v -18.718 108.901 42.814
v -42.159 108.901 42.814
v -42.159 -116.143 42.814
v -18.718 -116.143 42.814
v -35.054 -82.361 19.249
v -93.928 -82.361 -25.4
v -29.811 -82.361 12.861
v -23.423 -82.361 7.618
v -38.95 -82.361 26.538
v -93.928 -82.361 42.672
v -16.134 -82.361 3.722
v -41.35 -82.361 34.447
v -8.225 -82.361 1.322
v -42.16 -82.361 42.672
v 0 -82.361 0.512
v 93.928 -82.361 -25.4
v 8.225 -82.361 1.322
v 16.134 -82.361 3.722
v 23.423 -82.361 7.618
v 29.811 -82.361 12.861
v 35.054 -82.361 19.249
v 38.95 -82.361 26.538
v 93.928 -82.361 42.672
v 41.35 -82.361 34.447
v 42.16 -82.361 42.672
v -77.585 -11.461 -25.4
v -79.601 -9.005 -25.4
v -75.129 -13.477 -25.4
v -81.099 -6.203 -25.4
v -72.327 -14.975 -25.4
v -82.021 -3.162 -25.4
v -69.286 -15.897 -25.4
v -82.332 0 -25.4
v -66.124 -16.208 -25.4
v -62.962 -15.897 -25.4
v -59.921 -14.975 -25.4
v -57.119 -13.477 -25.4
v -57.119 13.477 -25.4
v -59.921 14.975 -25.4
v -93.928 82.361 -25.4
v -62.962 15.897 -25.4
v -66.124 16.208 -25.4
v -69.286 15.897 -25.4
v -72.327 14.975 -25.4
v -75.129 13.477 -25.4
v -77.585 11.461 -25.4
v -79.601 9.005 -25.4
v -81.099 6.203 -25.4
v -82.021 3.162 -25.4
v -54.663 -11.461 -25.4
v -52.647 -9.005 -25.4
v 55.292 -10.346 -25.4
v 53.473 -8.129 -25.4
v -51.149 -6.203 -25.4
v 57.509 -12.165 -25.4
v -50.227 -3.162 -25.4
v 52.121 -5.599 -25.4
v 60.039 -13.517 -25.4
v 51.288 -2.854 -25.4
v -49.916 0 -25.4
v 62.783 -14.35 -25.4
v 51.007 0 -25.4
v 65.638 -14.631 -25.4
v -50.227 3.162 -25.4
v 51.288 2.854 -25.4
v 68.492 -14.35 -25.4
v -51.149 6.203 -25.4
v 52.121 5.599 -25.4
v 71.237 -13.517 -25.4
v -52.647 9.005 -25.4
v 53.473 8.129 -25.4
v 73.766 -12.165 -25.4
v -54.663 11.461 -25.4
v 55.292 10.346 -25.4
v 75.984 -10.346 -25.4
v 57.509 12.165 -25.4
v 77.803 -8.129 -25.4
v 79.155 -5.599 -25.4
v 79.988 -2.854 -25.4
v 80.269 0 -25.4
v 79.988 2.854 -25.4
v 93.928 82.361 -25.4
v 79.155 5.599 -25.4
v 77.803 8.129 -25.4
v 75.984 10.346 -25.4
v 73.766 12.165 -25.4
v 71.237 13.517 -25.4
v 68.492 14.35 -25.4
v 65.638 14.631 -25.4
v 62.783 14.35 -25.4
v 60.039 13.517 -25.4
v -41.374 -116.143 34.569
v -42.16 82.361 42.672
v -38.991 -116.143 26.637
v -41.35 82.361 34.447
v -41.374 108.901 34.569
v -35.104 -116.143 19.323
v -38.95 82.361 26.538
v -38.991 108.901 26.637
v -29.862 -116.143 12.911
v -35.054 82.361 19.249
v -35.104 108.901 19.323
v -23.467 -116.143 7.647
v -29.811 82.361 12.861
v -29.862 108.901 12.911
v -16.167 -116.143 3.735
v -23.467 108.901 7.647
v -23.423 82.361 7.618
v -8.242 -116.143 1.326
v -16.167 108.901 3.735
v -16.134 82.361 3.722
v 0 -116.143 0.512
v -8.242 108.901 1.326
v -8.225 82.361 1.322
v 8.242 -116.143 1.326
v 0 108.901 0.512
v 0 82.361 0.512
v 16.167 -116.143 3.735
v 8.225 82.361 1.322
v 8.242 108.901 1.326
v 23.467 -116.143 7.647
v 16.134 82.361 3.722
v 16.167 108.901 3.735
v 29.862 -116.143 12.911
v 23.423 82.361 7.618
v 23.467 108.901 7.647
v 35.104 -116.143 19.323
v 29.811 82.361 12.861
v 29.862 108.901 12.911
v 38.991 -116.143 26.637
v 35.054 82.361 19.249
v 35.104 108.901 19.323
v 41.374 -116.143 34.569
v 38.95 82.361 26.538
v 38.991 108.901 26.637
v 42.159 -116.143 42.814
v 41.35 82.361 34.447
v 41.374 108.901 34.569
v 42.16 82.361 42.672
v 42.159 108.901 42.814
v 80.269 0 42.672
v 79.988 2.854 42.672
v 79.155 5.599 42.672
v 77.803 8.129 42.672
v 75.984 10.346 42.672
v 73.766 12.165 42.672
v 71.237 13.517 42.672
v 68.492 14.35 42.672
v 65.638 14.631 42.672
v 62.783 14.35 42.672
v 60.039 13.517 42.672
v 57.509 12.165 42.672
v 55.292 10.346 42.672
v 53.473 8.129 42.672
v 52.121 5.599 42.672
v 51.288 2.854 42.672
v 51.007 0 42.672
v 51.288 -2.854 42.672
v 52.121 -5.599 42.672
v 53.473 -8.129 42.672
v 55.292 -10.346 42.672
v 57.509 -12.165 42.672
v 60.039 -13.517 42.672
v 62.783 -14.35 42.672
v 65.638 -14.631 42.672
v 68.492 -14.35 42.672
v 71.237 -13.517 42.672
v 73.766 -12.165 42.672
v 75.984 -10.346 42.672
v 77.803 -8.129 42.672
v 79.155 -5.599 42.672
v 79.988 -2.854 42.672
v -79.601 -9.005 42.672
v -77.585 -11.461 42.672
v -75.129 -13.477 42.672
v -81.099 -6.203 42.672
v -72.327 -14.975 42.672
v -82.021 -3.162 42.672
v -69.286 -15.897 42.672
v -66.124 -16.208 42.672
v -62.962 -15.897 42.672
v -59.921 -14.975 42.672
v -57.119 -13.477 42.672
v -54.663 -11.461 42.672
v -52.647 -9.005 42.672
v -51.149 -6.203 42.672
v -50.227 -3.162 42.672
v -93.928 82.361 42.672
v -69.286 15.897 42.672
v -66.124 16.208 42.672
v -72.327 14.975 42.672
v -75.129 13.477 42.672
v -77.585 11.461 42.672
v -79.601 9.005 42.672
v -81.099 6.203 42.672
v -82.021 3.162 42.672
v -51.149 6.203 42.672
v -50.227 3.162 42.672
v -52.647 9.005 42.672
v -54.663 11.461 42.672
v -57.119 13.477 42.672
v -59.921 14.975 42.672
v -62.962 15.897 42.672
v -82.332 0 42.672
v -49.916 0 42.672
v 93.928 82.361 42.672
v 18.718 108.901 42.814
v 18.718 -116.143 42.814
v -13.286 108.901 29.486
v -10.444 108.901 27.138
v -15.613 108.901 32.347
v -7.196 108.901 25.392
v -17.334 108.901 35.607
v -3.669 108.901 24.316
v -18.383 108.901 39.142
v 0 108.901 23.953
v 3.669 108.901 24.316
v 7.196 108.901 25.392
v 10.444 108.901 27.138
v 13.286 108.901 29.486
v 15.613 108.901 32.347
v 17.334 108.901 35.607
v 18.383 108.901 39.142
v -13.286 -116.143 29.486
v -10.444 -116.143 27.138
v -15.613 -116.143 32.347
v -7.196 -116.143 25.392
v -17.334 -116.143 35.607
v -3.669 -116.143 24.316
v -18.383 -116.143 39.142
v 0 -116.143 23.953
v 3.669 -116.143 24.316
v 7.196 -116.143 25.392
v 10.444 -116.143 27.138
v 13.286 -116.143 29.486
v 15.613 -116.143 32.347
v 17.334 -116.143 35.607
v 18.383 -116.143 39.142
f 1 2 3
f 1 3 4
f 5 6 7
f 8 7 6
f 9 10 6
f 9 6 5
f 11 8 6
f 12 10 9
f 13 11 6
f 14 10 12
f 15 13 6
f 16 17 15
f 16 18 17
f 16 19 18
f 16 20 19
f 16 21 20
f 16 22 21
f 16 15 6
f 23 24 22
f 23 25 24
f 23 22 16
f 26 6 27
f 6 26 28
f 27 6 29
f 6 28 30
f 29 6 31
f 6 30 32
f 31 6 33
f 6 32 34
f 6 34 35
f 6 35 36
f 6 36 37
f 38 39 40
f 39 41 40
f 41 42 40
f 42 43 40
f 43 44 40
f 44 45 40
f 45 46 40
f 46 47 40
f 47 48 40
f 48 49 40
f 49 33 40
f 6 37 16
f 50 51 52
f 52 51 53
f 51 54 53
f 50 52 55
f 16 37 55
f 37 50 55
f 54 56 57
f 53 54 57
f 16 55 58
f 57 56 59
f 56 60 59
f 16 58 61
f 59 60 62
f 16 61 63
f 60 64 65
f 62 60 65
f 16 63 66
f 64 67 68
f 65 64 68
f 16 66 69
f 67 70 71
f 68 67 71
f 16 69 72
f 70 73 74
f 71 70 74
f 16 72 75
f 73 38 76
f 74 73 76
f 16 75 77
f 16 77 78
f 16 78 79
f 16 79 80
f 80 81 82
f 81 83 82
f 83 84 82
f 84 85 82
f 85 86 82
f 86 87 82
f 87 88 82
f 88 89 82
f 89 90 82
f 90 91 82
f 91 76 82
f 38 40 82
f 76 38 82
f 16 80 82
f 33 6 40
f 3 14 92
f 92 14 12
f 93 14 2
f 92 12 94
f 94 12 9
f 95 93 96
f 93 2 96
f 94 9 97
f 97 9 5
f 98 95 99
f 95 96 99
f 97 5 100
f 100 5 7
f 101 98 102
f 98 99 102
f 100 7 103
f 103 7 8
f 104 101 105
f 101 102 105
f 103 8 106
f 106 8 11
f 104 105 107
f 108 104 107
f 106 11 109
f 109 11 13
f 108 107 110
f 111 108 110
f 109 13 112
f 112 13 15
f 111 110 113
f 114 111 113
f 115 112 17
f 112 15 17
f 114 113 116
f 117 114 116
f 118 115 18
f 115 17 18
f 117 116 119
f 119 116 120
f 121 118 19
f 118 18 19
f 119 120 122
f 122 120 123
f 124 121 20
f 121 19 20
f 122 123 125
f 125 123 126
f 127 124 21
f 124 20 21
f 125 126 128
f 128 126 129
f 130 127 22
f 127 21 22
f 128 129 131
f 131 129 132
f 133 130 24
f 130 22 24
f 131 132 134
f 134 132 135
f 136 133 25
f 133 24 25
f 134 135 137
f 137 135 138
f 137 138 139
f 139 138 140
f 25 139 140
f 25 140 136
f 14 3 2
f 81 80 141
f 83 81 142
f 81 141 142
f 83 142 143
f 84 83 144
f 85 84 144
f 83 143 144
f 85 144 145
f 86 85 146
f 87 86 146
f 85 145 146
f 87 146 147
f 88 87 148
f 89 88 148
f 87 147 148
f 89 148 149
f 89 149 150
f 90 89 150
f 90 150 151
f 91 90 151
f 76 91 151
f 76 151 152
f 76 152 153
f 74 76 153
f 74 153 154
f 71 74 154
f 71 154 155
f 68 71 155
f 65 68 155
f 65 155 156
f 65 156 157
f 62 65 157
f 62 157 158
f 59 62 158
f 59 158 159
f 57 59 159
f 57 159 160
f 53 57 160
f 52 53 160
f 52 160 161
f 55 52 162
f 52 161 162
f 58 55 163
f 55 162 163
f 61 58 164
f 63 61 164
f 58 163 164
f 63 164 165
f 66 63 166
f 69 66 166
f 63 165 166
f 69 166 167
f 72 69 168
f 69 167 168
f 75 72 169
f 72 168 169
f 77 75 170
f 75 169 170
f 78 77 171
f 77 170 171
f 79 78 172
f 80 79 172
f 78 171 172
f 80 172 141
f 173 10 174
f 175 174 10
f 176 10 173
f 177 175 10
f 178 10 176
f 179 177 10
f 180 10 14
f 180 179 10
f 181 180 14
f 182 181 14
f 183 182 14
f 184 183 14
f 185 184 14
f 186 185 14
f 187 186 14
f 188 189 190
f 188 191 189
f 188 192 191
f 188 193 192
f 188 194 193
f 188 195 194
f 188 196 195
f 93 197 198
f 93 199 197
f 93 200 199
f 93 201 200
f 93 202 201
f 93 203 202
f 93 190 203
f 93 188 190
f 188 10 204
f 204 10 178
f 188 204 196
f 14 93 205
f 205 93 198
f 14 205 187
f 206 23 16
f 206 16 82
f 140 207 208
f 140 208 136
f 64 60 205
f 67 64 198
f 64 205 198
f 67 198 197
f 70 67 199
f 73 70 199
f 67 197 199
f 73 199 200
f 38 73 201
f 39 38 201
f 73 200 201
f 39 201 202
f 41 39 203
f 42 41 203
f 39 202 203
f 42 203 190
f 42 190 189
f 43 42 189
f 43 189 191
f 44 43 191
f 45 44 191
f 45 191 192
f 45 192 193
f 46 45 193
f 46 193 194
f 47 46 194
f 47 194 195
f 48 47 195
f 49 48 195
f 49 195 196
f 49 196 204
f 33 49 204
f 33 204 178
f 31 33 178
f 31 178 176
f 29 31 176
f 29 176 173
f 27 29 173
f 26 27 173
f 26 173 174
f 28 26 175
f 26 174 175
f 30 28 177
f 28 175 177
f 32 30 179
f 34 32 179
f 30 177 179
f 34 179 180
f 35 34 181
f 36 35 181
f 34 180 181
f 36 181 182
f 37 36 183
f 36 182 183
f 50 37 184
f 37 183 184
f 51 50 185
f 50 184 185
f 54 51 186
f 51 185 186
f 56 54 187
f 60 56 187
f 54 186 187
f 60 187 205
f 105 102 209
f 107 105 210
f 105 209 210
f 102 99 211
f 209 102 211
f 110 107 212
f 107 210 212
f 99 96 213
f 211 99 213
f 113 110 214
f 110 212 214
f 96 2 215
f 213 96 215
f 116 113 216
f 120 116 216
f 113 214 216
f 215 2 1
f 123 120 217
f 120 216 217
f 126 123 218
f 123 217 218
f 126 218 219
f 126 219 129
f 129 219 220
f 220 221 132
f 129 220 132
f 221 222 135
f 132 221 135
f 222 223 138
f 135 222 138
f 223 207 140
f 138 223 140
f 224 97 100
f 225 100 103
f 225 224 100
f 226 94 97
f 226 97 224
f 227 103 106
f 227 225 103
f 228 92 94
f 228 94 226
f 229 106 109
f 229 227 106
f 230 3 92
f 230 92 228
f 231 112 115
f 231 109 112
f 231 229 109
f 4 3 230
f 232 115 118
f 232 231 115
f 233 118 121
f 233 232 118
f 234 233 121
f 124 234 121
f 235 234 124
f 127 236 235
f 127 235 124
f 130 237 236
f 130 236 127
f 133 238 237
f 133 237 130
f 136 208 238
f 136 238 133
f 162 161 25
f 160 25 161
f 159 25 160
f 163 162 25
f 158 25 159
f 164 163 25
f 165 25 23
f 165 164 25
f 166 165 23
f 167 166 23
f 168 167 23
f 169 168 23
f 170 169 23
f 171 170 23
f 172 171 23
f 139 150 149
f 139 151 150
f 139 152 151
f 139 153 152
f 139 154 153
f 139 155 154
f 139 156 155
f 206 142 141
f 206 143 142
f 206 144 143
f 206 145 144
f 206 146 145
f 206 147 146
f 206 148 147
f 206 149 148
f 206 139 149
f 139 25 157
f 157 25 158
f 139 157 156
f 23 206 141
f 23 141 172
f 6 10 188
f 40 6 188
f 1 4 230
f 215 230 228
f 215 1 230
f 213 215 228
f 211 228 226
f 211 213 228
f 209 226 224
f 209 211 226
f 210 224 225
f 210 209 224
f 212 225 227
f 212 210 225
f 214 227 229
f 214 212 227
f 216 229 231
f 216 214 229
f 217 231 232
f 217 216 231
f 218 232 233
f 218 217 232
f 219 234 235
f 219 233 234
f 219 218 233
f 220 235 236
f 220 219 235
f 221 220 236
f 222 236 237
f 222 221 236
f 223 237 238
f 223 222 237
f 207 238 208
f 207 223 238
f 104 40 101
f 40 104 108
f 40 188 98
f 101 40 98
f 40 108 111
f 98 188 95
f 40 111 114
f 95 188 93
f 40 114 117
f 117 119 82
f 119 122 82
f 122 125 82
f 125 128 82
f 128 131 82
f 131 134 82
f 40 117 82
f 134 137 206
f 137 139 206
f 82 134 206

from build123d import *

# Parameters (mm, degrees)
F0_W          = 187.8567785025
F0_H          = 164.7213101387
F1_DEPTH      = 25.4
F2_DEPTH      = 17.272
F3_R          = 42.1596023767
F3_R_2        = 18.71871866
F4_DEPTH      = 191.262
F4_DEPTH_BACK = 33.782
F5_DEPTH      = 191.263
F7_DEPTH      = 191.263
F7_DEPTH_BACK = 101.6
F8_R          = 16.2084623058
F8_R_2        = 14.6310298949
F9_DEPTH      = 68.073


with BuildPart() as f1:
    # F0 (on Top) → F1 (new body, symmetric)
    with BuildSketch(Plane.XY):
        Rectangle(F0_W, F0_H)
    extrude(amount=F1_DEPTH, both=True)

    # F2 (add, symmetric): a face of the model
    f2_faces = [f1.faces().sort_by_distance(p)[0] for p in [
        (0, 0, 25.4),
    ]]
    extrude(f2_faces, amount=F2_DEPTH, both=True)

    # F3 (on face) → F4 (join, two sides)
    with BuildSketch(Plane.XZ.offset(82.3606550694)) as f4_sk:
        with Locations((0, 42.672)):
            Circle(F3_R)
        with Locations((0, 42.672)):
            Circle(F3_R_2, mode=Mode.SUBTRACT)
    extrude(amount=-F4_DEPTH)
    extrude(f4_sk.sketch, amount=F4_DEPTH_BACK)

    # F3 (on face) → F5 (cut, through all)
    with BuildSketch(Plane.XZ.offset(82.3606550694)):
        with BuildLine():
            ThreePointArc((-18.71871866, 42.672), (0, 23.95328134), (18.71871866, 42.672))
            Line((18.71871866, 42.672), (-18.71871866, 42.672))
        make_face()
    extrude(amount=-F5_DEPTH, mode=Mode.SUBTRACT)

    # F6 (on face) → F7 (cut, two sides)
    with BuildSketch(Plane.XZ.offset(82.3606550694)) as f7_sk:
        Polygon((-50.2506420016, 42.8143106401), (0, 42.8143106401), (50.0124804676, 42.8143106401), (50.0124804676, 85.4440033436), (-50.2506420016, 85.4440033436), align=None)
    extrude(amount=-F7_DEPTH, mode=Mode.SUBTRACT)
    extrude(f7_sk.sketch, amount=F7_DEPTH_BACK, mode=Mode.SUBTRACT)

    # F8 (on face) → F9 (cut, through all)
    with BuildSketch(Plane.XY.offset(42.672)):
        with Locations((-66.1240369081, 0)):
            Circle(F8_R)
        with Locations((65.6378343701, 0)):
            Circle(F8_R_2)
    extrude(amount=-F9_DEPTH, mode=Mode.SUBTRACT)


solid = f1.part
